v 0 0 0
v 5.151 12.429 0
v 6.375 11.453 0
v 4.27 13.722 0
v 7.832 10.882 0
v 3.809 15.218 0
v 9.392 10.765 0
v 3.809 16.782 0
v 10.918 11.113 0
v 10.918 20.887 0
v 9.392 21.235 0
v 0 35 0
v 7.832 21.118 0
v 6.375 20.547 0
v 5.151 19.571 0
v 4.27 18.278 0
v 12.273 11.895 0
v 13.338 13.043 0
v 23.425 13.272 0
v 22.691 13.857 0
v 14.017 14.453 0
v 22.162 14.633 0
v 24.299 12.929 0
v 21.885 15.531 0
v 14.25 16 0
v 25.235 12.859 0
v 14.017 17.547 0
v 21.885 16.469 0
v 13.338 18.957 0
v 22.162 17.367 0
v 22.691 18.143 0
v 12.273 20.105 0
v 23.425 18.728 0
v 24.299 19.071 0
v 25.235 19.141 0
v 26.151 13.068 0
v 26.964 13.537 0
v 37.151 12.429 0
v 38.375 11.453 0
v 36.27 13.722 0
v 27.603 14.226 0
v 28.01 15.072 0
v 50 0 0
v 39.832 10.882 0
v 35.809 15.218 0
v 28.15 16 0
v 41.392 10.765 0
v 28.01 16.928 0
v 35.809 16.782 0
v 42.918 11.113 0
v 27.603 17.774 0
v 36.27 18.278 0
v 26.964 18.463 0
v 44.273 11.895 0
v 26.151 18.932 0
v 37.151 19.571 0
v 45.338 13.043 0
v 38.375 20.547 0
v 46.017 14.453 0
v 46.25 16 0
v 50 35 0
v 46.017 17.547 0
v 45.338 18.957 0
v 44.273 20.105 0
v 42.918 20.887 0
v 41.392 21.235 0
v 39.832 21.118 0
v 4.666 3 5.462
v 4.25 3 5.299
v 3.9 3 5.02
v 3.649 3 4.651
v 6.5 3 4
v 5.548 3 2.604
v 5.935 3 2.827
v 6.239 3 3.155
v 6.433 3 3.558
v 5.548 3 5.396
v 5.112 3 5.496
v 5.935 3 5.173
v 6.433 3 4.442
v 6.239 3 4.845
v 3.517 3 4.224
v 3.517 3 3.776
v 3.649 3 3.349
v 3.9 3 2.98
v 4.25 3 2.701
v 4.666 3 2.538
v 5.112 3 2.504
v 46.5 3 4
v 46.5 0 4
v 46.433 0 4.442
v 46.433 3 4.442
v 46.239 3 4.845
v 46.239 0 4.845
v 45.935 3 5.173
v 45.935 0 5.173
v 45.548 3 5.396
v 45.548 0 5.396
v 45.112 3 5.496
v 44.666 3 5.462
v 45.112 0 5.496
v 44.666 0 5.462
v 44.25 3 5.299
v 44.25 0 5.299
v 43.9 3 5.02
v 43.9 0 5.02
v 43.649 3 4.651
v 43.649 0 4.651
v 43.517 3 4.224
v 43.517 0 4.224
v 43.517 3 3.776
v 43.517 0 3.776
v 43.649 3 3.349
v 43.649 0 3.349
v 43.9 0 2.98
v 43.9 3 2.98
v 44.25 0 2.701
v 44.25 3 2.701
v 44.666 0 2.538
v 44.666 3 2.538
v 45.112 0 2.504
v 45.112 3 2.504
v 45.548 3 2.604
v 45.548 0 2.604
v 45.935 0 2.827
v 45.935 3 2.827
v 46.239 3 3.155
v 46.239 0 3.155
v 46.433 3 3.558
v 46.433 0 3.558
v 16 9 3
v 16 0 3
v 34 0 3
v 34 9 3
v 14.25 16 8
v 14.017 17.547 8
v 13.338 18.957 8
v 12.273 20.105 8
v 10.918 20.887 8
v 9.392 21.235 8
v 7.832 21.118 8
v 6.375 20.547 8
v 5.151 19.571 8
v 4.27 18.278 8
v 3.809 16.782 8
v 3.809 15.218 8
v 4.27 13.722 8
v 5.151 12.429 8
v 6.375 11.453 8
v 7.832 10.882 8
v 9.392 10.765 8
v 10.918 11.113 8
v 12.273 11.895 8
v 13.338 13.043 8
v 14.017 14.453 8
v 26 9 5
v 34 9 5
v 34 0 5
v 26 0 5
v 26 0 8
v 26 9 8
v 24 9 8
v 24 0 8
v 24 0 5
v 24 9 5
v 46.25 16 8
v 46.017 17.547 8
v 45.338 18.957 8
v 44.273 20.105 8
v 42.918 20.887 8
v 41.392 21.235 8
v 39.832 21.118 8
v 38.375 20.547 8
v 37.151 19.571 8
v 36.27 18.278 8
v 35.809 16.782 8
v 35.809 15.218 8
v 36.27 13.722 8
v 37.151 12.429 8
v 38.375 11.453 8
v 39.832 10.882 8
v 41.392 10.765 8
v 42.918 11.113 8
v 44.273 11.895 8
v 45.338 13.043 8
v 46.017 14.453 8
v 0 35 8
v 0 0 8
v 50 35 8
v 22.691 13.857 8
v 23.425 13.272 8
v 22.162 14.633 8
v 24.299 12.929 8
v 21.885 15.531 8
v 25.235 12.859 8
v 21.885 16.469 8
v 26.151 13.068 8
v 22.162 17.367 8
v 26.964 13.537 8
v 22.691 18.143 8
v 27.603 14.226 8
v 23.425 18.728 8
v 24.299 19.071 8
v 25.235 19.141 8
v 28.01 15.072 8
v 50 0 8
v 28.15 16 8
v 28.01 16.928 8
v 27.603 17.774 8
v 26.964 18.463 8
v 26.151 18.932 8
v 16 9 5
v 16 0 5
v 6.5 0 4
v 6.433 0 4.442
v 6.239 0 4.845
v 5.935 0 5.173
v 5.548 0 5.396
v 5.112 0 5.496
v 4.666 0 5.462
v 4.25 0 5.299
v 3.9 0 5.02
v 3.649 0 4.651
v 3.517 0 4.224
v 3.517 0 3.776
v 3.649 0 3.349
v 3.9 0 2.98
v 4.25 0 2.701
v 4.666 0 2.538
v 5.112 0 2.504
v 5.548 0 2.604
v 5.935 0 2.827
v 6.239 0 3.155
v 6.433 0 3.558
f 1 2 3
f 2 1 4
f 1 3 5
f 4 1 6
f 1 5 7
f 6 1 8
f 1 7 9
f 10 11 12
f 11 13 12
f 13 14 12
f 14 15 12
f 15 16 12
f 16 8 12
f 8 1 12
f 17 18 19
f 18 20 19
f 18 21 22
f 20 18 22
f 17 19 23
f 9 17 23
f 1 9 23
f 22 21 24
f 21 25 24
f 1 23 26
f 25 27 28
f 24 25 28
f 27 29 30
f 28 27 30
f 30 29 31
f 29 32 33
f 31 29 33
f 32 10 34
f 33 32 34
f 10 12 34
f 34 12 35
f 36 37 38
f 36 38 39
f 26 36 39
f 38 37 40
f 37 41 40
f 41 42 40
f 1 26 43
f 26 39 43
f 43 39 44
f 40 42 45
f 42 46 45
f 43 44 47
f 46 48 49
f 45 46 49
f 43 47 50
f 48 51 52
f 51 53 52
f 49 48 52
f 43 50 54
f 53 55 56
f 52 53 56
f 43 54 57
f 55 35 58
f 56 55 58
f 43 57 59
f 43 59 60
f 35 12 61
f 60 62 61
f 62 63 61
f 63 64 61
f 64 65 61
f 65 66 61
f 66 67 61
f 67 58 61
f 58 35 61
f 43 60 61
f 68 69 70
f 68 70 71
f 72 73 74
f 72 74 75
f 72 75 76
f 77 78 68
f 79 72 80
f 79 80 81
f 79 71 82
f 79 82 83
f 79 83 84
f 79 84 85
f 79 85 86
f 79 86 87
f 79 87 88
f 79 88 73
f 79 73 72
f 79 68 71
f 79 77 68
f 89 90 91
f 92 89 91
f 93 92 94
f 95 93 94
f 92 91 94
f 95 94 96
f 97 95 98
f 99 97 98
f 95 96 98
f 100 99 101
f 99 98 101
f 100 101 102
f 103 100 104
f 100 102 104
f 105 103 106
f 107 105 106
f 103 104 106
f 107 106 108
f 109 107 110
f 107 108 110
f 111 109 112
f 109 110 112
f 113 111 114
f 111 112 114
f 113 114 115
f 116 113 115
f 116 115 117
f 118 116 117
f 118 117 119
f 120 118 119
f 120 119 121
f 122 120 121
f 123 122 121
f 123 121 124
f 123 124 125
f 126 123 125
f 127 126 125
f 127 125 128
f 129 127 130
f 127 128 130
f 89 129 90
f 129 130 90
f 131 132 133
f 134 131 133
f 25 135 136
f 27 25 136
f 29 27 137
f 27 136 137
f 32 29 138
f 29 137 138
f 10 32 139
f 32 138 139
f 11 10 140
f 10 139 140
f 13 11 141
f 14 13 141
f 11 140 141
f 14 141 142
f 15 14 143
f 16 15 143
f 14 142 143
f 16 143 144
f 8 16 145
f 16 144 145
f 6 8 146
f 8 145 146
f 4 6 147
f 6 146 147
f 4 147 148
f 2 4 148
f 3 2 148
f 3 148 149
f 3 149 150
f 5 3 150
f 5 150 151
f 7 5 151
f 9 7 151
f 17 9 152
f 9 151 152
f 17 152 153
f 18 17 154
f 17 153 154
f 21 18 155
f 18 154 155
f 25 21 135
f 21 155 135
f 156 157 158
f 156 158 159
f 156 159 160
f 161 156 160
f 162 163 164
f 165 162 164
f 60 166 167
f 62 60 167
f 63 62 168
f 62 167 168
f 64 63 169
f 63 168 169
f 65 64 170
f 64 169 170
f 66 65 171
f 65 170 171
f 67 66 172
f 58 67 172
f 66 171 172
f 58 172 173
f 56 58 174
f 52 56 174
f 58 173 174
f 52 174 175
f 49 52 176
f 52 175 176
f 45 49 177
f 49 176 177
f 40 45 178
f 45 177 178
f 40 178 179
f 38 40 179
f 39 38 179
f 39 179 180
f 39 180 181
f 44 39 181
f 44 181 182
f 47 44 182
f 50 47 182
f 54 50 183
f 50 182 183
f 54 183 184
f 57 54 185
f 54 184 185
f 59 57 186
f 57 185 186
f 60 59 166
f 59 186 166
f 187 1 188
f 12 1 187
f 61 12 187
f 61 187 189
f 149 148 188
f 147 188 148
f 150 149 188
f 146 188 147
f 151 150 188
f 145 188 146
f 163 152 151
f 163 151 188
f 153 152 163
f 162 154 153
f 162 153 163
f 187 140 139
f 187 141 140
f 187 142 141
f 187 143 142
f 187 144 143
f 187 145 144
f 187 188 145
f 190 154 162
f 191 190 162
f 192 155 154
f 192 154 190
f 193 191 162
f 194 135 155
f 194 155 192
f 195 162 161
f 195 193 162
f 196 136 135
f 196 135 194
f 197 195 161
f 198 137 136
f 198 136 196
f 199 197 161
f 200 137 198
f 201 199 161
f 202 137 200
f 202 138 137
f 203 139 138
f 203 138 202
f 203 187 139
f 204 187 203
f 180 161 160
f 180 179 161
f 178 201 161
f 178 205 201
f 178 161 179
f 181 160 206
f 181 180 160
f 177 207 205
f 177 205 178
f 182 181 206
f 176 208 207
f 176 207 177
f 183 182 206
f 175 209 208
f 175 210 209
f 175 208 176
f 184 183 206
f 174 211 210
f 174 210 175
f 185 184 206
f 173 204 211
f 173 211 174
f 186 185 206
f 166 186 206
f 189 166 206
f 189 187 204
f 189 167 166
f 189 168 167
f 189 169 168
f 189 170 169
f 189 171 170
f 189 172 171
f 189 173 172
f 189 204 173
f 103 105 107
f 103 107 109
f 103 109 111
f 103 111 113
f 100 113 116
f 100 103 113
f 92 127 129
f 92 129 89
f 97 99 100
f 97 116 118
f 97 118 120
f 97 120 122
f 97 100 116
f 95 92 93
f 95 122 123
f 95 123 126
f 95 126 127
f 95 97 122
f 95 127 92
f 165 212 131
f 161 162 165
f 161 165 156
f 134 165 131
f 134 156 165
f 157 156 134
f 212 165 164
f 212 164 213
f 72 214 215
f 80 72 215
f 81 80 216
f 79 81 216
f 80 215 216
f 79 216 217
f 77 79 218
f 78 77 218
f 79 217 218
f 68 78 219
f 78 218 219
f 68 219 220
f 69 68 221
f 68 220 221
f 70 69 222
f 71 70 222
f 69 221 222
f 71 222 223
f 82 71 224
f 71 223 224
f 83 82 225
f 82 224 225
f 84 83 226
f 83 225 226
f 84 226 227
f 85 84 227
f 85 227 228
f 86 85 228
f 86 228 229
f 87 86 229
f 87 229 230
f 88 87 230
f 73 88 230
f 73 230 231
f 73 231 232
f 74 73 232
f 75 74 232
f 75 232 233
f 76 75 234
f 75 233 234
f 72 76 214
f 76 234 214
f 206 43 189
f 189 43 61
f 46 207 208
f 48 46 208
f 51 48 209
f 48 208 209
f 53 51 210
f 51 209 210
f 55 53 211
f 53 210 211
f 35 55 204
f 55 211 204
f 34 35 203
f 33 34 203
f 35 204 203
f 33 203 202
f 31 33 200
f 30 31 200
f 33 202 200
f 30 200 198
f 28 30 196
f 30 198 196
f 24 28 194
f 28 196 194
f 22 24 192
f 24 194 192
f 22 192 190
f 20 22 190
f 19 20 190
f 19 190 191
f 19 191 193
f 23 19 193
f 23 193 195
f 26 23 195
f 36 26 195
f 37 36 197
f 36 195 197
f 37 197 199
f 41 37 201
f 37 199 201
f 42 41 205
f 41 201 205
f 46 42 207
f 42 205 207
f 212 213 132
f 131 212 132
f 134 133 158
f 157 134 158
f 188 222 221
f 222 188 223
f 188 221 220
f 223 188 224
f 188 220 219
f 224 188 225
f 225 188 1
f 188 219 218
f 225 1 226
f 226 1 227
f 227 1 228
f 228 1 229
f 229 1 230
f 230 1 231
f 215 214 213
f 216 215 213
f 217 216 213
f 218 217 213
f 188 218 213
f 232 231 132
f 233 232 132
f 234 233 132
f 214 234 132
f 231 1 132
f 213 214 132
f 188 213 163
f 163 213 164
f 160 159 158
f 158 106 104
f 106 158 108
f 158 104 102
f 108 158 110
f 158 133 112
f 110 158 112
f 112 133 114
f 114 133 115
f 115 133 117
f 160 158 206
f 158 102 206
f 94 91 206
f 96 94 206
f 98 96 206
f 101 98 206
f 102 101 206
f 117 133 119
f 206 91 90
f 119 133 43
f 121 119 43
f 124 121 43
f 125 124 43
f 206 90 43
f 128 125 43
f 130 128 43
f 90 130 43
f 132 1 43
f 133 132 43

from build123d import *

# Parameters (mm, degrees)
F0_W     = 50
F0_H     = 35
F1_DEPTH = 8
F2_R     = 5.25
F2_R_2   = 3.15
F3_DEPTH = 8
F4_R     = 1.5
F5_DEPTH = 3
F6_DEPTH = 9


with BuildPart() as f1:
    # F0 (on Top) → F1 (new body)
    with BuildSketch(Plane.XY):
        with Locations((25, 17.5)):
            Rectangle(F0_W, F0_H)
    extrude(amount=F1_DEPTH)

    # F2 (on face) → F3 (cut)
    with BuildSketch(Plane.XY.offset(8)):
        with Locations((9, 16)):
            Circle(F2_R)
        with Locations((41, 16)):
            Circle(F2_R)
        with Locations((25, 16)):
            Circle(F2_R_2)
    extrude(amount=-F3_DEPTH, mode=Mode.SUBTRACT)

    # F4 (on face) → F5 (cut)
    with BuildSketch(Plane.XZ):
        with Locations((5, 4)):
            Circle(F4_R)
        with Locations((45, 4)):
            Circle(F4_R)
    extrude(amount=-F5_DEPTH, mode=Mode.SUBTRACT)

    # F4 (on face) → F6 (cut)
    with BuildSketch(Plane.XZ):
        Polygon((26, 8), (24, 8), (24, 5), (16, 5), (16, 3), (34, 3), (34, 5), (26, 5), align=None)
    extrude(amount=-F6_DEPTH, mode=Mode.SUBTRACT)


solid = f1.part
